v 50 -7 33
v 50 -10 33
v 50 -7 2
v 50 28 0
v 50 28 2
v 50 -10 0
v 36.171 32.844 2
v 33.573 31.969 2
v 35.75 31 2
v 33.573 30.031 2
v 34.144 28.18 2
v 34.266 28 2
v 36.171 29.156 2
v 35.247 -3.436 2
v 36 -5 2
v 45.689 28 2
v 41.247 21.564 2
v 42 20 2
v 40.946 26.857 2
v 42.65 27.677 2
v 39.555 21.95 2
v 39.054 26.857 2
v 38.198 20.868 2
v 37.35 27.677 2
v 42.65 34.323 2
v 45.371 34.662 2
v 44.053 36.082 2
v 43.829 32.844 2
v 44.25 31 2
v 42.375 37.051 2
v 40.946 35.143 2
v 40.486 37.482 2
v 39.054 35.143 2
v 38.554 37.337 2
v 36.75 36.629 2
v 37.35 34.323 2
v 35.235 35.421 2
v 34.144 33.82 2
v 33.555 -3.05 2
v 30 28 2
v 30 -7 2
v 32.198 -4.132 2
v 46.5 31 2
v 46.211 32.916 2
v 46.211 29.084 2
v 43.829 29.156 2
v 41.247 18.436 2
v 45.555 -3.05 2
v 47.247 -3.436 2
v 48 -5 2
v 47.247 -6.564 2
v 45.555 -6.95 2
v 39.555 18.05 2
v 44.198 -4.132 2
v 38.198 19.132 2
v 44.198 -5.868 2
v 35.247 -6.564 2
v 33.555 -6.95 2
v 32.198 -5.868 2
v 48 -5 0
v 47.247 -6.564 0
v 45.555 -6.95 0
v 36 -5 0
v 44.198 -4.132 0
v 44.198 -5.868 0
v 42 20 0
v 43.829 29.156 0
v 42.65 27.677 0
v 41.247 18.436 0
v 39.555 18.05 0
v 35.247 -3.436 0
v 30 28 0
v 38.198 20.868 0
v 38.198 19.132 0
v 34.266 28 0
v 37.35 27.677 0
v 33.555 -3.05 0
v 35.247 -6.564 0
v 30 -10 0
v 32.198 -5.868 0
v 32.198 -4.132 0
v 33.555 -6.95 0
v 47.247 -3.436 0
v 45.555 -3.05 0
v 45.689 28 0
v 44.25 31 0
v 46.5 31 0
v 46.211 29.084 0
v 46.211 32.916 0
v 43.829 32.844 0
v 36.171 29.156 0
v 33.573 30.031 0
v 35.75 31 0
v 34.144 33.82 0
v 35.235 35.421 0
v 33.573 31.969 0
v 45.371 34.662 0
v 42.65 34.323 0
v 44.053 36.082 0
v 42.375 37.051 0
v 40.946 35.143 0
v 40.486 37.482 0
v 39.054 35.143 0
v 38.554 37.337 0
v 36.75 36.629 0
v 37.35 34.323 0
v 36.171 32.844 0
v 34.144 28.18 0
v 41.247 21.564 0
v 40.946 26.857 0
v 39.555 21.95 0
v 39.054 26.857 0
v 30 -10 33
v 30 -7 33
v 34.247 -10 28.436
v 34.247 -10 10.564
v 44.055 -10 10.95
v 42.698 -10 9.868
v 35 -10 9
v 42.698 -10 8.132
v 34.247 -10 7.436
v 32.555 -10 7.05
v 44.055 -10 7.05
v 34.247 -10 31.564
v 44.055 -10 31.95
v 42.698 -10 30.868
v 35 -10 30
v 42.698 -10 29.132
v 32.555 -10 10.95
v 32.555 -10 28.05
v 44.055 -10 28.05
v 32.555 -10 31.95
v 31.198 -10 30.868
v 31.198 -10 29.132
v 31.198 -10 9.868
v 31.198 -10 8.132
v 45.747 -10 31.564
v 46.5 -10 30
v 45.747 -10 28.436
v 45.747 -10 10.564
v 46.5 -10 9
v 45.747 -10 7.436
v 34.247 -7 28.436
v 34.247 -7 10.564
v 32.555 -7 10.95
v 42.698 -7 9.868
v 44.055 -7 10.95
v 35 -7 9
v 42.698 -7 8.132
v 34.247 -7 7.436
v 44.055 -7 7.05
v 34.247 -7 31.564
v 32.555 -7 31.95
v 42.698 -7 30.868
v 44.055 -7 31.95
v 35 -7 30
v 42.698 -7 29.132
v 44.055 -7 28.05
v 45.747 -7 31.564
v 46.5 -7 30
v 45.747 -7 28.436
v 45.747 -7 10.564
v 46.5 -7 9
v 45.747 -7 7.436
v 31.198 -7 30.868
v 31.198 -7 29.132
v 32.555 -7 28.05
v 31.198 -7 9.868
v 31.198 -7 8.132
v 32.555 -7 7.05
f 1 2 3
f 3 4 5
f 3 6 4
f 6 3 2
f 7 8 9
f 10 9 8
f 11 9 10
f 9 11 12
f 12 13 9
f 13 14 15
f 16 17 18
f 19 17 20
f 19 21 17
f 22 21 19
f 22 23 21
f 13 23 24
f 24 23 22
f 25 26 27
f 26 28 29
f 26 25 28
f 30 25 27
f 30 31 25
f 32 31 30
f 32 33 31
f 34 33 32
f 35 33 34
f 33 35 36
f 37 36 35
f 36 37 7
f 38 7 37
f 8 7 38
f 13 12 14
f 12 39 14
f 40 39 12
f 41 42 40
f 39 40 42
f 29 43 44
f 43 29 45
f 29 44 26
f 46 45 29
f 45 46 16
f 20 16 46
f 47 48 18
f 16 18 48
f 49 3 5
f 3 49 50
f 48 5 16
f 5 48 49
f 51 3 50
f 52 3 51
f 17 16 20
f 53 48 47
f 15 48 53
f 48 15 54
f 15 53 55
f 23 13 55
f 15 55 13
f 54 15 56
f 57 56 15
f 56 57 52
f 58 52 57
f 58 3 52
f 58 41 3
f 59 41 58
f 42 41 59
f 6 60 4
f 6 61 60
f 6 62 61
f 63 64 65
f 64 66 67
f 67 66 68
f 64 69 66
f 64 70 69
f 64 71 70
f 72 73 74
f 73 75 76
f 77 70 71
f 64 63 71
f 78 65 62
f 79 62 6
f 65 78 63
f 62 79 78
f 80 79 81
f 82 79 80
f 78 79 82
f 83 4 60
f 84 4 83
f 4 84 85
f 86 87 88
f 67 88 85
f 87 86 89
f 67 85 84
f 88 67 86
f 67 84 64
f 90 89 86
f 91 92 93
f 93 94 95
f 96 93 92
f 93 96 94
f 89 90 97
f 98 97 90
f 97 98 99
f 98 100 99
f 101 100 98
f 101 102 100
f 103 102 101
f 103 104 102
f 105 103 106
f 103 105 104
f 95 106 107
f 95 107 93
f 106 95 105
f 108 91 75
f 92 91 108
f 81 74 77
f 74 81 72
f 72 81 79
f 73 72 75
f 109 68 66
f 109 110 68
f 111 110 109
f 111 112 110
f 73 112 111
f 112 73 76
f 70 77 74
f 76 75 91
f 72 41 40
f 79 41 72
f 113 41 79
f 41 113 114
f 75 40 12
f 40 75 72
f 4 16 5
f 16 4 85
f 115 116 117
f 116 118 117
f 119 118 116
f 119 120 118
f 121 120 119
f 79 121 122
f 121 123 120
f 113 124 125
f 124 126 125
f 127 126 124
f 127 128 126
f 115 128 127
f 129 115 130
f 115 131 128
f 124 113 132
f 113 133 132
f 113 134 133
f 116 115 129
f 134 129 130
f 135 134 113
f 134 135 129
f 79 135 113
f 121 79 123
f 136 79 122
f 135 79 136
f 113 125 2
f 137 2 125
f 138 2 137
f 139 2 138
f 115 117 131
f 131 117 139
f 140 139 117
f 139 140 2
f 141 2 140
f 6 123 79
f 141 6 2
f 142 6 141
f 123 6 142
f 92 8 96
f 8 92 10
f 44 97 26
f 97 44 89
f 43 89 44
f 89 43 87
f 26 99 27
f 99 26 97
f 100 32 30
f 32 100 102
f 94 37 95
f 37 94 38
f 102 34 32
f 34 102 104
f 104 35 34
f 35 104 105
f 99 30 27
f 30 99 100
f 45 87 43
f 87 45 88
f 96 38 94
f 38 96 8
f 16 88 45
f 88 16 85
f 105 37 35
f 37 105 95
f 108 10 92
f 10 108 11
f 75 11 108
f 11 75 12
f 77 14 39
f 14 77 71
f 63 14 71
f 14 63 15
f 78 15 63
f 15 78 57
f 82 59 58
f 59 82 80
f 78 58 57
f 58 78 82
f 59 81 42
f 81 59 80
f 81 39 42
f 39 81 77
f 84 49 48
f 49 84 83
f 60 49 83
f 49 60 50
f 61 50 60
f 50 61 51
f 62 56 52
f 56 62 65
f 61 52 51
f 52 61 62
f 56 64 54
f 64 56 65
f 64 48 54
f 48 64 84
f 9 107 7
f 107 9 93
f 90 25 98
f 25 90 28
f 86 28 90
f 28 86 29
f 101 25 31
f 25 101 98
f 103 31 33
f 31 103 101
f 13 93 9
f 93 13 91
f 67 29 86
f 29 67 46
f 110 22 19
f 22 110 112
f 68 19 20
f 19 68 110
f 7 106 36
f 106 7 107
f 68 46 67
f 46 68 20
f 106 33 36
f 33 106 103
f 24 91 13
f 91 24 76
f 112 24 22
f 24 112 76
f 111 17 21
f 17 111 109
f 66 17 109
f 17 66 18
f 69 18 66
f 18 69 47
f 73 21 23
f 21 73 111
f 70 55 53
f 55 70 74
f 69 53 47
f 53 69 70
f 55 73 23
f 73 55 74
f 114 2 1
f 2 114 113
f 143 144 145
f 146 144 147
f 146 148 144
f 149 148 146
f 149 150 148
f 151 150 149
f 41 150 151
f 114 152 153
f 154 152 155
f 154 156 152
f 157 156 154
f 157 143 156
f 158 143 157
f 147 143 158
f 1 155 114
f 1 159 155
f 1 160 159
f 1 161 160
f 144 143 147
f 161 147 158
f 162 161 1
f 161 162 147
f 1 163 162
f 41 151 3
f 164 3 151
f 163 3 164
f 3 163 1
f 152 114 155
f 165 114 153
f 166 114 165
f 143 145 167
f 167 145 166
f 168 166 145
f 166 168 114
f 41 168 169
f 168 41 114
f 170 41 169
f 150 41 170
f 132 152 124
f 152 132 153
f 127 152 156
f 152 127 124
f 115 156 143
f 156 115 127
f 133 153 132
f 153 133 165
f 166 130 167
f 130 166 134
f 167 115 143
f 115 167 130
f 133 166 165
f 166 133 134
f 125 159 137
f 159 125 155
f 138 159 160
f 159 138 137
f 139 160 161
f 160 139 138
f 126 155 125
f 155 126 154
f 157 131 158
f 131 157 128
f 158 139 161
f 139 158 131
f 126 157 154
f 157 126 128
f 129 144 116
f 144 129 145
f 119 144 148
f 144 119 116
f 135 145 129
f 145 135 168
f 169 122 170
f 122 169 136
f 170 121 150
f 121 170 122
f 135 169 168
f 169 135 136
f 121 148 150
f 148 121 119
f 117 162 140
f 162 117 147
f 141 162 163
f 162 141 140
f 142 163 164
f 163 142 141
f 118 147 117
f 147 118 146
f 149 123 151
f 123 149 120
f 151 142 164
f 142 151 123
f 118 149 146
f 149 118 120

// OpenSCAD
//color("green") import("C:/Users/atlan/Downloads/LaserHand.stl");

difference() {
  union() {
  translate([30,-10,0]) cube([20,38,2]);
  translate([40,31,0]) cylinder(2,6.5,6.5);;
  }

  translate([34,-5,0]) cylinder(6,2,2);
  translate([46,-5,0]) cylinder(6,2,2);
  translate([40,31,0]) cylinder(6,4.25,4.25);
    translate([40,20,0])cylinder(6,2,2);
}
difference() {
translate([30,-10,0]) cube([20,3,33]);
translate([33,-6,30]) rotate([90,0,0])cylinder(6,r=2);
translate([44.5,-6,30]) rotate([90,0,0])cylinder(6,r=2);
translate([33,-6,9]) rotate([90,0,0])cylinder(6,r=2);
translate([44.5,-6,9]) rotate([90,0,0])cylinder(6,r=2);
}
